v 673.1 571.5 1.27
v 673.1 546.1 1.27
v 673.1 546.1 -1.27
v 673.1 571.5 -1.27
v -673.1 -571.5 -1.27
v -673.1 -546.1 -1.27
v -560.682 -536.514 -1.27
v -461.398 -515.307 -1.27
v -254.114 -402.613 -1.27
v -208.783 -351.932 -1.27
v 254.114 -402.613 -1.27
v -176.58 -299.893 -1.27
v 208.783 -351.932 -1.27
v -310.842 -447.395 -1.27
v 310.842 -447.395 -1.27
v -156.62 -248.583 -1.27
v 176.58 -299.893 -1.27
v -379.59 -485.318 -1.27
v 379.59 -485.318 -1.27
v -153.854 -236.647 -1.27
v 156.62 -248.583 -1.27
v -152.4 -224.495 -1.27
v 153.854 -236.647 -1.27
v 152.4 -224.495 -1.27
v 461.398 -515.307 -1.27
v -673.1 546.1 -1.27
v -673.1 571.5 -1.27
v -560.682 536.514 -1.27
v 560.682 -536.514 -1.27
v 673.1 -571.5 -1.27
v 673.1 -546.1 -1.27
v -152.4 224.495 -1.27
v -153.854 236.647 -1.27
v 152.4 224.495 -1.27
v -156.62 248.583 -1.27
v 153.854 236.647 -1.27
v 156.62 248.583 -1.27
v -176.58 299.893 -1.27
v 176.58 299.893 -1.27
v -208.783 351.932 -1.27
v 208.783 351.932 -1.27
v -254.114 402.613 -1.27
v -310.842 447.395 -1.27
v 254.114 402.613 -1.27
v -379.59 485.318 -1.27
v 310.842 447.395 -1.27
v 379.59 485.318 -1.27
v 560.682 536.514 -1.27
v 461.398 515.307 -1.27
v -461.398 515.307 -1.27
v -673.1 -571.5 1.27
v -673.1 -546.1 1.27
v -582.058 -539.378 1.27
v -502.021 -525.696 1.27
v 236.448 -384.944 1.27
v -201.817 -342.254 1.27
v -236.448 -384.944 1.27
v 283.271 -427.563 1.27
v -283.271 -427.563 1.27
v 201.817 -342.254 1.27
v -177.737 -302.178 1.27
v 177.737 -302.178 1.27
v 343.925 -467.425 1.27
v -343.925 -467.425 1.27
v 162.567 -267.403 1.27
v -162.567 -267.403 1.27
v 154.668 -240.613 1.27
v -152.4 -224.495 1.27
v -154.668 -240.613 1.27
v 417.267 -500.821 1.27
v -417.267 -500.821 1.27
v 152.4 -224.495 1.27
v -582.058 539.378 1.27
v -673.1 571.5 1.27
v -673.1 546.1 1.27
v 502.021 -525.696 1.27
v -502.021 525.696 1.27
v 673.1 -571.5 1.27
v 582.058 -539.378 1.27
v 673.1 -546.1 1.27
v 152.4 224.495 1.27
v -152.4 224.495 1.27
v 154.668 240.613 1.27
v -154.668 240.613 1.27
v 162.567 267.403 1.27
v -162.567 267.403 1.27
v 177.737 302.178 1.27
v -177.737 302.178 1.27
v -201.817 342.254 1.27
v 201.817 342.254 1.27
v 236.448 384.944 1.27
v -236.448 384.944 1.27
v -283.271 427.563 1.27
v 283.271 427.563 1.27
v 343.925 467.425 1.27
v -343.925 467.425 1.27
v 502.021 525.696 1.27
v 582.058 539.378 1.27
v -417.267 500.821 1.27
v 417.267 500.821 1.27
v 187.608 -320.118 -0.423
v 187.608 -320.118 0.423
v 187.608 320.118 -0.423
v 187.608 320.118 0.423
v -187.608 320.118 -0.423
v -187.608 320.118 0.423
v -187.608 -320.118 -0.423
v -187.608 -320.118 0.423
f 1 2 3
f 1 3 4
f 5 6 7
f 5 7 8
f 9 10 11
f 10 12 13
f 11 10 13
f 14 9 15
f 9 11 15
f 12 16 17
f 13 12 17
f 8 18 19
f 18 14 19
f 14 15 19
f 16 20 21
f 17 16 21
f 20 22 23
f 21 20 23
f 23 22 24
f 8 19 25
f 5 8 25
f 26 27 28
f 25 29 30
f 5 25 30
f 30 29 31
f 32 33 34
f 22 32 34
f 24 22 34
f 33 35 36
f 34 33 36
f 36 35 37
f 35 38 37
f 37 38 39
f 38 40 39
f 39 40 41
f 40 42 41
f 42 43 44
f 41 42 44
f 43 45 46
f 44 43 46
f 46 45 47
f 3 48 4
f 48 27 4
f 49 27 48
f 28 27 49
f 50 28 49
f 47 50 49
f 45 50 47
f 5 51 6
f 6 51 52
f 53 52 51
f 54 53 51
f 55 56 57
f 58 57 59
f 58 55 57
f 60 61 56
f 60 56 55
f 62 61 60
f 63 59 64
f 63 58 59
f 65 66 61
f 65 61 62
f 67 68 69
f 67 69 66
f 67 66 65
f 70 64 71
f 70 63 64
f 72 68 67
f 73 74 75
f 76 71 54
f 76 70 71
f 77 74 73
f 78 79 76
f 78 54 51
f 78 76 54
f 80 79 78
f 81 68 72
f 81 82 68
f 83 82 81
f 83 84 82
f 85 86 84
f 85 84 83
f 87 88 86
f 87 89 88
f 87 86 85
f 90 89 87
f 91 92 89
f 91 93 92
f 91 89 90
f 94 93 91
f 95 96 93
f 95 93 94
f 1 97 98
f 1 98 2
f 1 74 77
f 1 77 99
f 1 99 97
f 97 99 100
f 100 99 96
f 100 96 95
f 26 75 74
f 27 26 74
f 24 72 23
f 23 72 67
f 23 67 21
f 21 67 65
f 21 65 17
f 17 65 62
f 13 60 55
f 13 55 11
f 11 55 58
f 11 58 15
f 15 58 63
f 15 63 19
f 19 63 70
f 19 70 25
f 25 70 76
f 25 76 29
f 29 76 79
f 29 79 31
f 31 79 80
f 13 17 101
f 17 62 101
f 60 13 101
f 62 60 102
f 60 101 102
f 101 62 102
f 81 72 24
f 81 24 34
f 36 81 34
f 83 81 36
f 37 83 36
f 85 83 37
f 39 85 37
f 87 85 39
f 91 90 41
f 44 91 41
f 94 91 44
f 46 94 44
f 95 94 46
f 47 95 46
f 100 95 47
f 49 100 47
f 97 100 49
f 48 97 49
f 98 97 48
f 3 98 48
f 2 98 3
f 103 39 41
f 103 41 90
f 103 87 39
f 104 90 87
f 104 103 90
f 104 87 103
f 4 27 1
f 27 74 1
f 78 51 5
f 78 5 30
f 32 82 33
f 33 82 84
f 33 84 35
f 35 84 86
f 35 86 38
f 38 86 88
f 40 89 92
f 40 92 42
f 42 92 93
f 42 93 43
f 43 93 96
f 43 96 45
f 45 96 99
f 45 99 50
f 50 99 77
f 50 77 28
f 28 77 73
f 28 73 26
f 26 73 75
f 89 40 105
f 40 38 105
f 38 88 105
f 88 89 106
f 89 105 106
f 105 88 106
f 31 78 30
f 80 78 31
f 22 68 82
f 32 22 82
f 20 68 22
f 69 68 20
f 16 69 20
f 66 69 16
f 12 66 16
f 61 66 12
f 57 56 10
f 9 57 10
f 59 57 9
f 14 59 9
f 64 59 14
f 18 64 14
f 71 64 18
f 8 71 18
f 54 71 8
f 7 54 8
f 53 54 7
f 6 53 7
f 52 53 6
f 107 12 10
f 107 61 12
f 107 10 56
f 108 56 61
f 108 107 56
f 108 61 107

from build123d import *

# Parameters (mm, degrees)
SKETCH1_W           = 1346.2
SKETCH1_H           = 1143
BOSS_EXTRUDE1_DEPTH = 1.27
CUT_EXTRUDE1_DEPTH  = 3.54


with BuildPart() as part:
    # Sketch1 → Boss-Extrude1 (new body, symmetric)
    with BuildSketch(Plane.XY):
        Rectangle(SKETCH1_W, SKETCH1_H)
    extrude(amount=BOSS_EXTRUDE1_DEPTH, both=True)

    # Sketch2 → Cut-Extrude1 (cut, through all)
    with BuildSketch(Plane.XY.offset(1.27)):
        with BuildLine():
            Line((-673.1, 546.1), (-673.1, -546.1))
            add(Edge.make_bspline(
                [(-152.4, -224.495117073), (-152.4, -258.704669829), (-224.053162497, -532.777731838), (-673.1, -546.1)],
                knots=[0, 0, 0, 0, 1, 1, 1, 1], degree=3))
            Line((-152.4, -224.495117073), (-152.4, 224.495117073))
            add(Edge.make_bspline(
                [(-152.4, 224.495117073), (-152.4, 258.704669829), (-224.053162497, 532.777731838), (-673.1, 546.1)],
                knots=[0, 0, 0, 0, 1, 1, 1, 1], degree=3))
        make_face()
        with BuildLine():
            Line((673.1, 546.1), (673.1, -546.1))
            add(Edge.make_bspline(
                [(152.4, -224.495117073), (152.4, -258.704669829), (224.053162497, -532.777731838), (673.1, -546.1)],
                knots=[0, 0, 0, 0, 1, 1, 1, 1], degree=3))
            Line((152.4, -224.495117073), (152.4, 224.495117073))
            add(Edge.make_bspline(
                [(152.4, 224.495117073), (152.4, 258.704669829), (224.053162497, 532.777731838), (673.1, 546.1)],
                knots=[0, 0, 0, 0, 1, 1, 1, 1], degree=3))
        make_face()
    extrude(amount=-CUT_EXTRUDE1_DEPTH, mode=Mode.SUBTRACT)


solid = part.part
